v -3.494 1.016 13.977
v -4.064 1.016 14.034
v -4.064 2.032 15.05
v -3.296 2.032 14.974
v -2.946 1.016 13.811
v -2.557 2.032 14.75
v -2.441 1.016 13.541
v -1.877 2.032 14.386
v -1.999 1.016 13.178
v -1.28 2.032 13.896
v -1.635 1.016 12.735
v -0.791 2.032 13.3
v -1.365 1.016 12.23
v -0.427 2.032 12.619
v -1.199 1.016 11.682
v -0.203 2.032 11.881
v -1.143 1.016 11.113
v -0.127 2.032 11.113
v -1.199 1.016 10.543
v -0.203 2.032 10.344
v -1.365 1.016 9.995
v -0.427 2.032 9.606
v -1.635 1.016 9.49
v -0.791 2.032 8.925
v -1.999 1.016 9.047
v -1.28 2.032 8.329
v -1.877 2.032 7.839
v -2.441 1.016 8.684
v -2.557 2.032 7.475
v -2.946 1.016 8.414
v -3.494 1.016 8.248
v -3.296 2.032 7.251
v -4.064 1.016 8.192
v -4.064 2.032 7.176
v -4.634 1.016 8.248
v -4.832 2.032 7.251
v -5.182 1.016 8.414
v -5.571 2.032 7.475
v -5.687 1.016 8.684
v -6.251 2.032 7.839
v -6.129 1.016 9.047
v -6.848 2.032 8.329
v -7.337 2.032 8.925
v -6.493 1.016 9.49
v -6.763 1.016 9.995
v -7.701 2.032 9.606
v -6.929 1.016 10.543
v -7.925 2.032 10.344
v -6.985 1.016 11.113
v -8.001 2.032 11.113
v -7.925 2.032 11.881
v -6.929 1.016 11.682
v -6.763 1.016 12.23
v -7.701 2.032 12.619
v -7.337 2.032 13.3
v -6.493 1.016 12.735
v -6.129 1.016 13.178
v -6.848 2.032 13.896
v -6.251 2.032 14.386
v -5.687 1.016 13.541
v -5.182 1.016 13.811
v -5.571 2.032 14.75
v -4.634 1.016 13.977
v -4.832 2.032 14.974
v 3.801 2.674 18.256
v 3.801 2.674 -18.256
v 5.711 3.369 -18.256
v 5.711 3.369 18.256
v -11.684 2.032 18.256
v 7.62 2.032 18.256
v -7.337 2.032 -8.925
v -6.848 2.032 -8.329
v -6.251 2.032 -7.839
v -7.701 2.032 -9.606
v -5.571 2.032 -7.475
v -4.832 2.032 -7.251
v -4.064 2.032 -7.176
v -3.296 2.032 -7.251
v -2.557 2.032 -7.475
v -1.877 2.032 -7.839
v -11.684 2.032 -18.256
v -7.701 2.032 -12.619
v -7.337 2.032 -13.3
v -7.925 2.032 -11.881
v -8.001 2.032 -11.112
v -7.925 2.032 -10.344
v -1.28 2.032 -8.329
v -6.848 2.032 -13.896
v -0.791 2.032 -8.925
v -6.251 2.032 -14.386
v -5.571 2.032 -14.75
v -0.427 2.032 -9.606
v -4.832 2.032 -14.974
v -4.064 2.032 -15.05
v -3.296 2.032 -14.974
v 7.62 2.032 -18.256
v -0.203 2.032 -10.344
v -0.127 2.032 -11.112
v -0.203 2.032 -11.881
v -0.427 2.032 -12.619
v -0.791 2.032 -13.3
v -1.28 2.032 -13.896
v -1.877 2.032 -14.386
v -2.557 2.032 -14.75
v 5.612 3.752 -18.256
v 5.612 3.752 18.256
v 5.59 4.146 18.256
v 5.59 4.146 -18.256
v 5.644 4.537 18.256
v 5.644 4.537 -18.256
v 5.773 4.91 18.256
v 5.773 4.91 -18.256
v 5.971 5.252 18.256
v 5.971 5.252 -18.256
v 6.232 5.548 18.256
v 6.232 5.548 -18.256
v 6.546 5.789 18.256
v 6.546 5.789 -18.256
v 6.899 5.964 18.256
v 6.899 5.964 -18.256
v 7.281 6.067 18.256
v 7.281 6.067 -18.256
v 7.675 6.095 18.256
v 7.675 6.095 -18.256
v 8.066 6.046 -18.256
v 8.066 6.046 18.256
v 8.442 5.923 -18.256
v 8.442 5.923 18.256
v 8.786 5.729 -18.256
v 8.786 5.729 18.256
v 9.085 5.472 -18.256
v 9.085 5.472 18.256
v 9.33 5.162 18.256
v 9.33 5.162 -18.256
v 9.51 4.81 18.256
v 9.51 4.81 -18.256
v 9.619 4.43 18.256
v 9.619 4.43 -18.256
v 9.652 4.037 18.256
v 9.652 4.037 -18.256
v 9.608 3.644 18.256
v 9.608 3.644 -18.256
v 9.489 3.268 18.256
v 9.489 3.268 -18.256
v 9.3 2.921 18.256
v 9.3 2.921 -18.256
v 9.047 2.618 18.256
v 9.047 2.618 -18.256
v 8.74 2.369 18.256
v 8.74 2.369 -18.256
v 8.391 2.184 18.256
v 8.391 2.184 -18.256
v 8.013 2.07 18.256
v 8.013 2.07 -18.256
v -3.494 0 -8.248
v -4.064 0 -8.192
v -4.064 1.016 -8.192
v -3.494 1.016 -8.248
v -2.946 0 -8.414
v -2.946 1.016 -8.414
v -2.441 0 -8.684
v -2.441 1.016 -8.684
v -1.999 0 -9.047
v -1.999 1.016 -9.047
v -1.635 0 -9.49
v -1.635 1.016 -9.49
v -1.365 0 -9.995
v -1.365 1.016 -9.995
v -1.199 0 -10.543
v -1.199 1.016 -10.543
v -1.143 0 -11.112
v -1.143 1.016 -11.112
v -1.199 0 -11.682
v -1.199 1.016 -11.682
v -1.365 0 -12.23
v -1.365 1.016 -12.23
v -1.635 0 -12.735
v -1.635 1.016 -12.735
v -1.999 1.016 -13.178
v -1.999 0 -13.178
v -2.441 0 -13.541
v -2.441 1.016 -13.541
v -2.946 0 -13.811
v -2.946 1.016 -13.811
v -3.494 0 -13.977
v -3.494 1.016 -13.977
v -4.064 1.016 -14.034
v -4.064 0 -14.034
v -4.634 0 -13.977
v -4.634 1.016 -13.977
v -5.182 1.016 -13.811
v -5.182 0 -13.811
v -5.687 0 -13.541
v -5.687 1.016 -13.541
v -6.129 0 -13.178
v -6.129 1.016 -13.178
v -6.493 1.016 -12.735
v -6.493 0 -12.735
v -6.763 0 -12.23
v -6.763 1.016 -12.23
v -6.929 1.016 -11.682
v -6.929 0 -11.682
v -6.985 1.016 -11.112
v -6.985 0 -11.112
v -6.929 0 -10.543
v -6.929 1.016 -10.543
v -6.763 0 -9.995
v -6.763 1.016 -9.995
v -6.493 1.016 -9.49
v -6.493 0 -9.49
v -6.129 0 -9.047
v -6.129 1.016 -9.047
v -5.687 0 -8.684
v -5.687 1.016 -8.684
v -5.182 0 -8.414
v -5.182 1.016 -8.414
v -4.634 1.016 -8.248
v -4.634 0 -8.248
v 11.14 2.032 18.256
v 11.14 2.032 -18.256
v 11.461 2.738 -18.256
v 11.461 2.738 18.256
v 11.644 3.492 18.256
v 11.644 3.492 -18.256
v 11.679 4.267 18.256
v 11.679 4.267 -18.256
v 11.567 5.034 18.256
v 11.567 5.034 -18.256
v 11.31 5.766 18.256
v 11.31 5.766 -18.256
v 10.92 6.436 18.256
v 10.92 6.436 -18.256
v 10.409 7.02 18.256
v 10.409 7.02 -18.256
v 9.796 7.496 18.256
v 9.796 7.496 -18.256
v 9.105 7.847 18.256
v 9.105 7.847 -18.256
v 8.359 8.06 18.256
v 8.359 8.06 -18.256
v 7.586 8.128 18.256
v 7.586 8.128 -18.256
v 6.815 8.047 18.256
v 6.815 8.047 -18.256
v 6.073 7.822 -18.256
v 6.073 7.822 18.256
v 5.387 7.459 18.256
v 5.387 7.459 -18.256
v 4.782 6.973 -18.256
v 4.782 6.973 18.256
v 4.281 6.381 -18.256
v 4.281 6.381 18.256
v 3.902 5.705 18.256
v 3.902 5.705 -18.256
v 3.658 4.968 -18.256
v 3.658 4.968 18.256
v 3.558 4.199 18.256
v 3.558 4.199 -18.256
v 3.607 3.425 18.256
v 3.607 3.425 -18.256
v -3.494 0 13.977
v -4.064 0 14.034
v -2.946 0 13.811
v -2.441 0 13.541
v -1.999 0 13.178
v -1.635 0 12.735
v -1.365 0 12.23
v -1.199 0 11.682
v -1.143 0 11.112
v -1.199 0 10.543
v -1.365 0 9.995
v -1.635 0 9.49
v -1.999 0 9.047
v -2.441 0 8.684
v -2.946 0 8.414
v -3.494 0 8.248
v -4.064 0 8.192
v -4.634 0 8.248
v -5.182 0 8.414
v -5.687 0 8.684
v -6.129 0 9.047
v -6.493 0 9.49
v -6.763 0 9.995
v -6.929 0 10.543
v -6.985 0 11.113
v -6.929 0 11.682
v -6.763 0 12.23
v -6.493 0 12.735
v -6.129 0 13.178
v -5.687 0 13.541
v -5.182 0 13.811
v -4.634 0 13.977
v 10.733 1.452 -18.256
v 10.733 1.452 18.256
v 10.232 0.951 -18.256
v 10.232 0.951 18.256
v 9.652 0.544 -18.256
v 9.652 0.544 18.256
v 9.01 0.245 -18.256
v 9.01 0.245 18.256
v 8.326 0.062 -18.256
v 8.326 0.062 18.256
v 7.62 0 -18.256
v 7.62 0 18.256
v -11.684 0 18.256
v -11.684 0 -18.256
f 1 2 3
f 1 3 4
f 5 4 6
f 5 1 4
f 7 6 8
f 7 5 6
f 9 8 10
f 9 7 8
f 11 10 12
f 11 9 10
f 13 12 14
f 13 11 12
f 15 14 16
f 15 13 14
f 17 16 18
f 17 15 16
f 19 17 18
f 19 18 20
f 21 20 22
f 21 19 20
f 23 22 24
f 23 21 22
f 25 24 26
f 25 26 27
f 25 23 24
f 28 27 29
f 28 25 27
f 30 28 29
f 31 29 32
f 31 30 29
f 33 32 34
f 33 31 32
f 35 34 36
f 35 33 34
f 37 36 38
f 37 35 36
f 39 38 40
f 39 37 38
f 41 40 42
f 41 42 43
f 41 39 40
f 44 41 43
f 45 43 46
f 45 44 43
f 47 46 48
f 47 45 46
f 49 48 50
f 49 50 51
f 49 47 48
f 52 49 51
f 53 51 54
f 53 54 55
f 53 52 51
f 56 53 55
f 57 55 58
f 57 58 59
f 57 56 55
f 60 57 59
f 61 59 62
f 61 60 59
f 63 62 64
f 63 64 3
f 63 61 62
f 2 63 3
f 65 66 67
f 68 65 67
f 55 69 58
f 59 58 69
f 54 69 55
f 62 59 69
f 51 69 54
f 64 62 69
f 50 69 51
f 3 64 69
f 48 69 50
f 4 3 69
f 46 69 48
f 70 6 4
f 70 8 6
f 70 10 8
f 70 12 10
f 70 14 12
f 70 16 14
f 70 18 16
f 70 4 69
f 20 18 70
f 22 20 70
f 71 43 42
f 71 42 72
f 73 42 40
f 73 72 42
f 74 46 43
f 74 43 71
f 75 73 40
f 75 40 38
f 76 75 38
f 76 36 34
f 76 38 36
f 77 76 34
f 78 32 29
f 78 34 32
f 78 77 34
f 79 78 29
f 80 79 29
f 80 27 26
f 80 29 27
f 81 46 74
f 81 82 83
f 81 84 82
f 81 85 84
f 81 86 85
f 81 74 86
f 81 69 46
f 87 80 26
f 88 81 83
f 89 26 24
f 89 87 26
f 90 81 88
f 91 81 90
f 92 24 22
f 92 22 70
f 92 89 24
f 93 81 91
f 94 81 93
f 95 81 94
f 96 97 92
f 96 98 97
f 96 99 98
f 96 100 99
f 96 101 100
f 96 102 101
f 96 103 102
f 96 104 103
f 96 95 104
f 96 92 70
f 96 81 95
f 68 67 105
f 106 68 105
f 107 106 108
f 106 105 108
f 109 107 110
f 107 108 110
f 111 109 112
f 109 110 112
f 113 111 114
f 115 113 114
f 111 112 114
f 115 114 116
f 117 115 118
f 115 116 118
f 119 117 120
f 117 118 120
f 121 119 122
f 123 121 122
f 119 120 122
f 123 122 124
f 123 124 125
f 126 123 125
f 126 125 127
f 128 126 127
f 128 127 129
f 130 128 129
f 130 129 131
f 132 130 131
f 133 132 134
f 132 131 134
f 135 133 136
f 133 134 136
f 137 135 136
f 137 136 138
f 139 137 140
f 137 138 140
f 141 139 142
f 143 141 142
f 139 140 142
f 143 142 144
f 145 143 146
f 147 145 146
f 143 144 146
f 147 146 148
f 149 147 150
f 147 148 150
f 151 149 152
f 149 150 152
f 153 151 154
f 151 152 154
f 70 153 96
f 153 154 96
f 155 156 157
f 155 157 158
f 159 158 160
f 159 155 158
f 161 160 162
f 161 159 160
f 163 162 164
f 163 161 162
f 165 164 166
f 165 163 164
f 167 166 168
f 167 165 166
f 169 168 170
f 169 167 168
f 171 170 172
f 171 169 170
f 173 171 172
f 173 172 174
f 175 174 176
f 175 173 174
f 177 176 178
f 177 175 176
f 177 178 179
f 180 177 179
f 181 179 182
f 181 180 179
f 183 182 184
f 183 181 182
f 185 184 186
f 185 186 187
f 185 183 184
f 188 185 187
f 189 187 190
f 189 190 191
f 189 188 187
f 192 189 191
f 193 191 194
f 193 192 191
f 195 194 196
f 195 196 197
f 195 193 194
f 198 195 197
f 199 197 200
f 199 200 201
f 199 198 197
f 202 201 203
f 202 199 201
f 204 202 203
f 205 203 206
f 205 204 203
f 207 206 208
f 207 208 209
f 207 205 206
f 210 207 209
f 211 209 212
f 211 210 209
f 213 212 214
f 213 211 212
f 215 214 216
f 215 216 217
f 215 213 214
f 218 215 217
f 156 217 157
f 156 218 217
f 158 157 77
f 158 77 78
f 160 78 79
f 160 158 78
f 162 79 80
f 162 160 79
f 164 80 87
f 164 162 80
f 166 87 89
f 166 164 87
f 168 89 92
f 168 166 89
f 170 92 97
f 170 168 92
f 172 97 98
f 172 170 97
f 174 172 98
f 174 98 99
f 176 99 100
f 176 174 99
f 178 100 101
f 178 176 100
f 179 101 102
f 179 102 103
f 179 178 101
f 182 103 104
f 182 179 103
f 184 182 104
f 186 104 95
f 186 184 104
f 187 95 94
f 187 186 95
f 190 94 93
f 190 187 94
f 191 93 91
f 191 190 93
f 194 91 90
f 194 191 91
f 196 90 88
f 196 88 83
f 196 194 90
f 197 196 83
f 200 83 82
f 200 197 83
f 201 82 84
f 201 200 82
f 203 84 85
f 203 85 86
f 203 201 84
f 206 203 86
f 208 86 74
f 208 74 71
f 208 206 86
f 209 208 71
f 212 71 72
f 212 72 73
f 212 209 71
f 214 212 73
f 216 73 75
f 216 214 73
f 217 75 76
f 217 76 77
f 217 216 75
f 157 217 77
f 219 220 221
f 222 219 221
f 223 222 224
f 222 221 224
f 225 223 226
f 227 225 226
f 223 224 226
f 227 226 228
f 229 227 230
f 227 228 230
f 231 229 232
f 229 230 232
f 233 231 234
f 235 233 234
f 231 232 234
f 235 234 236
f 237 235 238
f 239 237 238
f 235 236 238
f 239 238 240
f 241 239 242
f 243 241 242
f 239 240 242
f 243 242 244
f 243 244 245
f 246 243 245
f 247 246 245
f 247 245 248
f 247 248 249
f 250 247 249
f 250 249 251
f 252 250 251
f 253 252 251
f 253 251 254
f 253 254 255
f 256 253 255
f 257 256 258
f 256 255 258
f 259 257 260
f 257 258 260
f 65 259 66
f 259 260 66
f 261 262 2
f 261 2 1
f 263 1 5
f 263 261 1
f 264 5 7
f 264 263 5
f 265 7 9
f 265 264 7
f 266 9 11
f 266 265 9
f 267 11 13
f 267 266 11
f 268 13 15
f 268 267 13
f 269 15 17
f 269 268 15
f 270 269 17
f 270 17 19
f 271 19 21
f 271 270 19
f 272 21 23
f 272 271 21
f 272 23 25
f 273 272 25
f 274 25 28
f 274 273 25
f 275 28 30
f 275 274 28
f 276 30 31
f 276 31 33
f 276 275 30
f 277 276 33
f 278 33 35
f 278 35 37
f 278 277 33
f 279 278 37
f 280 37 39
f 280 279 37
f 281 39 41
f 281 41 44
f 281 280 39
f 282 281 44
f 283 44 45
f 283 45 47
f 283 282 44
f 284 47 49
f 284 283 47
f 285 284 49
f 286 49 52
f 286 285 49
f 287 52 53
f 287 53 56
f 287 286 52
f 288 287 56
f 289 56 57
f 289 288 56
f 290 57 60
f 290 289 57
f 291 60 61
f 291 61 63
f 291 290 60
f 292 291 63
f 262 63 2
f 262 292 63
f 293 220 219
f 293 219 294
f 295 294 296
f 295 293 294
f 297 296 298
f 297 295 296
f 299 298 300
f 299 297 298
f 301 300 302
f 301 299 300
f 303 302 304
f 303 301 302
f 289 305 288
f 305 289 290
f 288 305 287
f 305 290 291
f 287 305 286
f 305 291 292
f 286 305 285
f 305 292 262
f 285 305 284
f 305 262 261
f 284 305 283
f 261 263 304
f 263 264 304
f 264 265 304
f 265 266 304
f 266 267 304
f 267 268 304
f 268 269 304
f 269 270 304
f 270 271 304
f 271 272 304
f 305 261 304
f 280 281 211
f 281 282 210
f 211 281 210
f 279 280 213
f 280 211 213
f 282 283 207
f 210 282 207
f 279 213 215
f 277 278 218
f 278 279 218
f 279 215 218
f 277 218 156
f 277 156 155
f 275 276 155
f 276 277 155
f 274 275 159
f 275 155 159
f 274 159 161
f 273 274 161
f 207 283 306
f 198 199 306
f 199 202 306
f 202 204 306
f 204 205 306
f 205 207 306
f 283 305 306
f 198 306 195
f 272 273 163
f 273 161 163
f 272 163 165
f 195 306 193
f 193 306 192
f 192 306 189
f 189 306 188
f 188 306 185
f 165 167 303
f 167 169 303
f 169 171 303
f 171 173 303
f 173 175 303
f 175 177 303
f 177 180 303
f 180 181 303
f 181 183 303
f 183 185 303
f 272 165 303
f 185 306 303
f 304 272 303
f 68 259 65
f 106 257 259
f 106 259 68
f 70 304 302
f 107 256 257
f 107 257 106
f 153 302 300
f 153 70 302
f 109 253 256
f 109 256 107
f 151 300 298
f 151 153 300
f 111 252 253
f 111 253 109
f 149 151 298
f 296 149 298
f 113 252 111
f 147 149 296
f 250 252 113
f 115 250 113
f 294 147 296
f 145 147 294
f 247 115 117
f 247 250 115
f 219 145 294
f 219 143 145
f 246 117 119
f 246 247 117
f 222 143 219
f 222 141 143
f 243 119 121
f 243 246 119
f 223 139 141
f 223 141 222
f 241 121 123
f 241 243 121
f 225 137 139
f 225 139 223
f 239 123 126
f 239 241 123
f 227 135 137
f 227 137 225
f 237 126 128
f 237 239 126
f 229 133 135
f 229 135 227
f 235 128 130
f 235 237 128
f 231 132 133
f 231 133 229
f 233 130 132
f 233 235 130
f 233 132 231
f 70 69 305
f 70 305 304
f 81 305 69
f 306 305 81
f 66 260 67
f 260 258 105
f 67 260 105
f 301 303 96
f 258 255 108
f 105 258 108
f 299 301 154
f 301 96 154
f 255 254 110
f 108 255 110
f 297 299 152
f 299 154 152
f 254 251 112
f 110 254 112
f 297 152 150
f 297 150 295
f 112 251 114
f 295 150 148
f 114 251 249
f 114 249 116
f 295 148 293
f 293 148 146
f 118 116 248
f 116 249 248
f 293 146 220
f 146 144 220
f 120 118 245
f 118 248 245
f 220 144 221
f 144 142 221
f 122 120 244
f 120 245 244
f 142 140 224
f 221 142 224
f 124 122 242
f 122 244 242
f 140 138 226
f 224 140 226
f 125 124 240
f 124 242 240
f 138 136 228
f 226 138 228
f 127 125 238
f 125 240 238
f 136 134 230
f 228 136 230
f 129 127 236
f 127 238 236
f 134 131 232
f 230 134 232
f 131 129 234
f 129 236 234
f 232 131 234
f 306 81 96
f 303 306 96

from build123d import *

# Parameters (mm, degrees)
SKETCH1_W          = 23.368
SKETCH1_H          = 36.5125
SKETCH1_R          = 2.921
BASE_FLANGE1_DEPTH = 2.032
HEM1_START         = -18.25625
HEM1_DEPTH         = 36.5125
HEM1_2_DEPTH       = 36.5125
CHAMFER1_SIZE      = 1.016


# Read off the part's stored shape, not the designer's step: Hem1
# Sheet-metal steps are written as plain solids
with BuildPart() as part:
    # Sketch1 → Base-Flange1 (new body)
    with BuildSketch(Plane(origin=(0, 0, 0), x_dir=(1, 0, 0), z_dir=(0, 1, 0))):
        Rectangle(SKETCH1_W, SKETCH1_H)
        with Locations(Location((-4.064, -11.1125, 0), (0, 0, 270))):
            Circle(SKETCH1_R, mode=Mode.SUBTRACT)
        with Locations(Location((-4.064, 11.1125, 0), (0, 0, 270))):
            Circle(SKETCH1_R, mode=Mode.SUBTRACT)
    extrude(amount=BASE_FLANGE1_DEPTH)

    # Hem1 outline → Hem1 (cut)
    with BuildSketch(Plane.XY.offset(HEM1_START)):
        with BuildLine():
            Line((11.684, 2.032), (11.139527241, 2.032))
            ThreePointArc((11.139527241, 2.032), (9.652, 0.544472759), (7.62, 0))
            Line((7.62, 0), (11.684, 0))
            Line((11.684, 0), (11.684, 2.032))
        make_face()
    extrude(amount=HEM1_DEPTH, mode=Mode.SUBTRACT)

    # Hem1 2 outline → Hem1 2 (add)
    with BuildSketch(Plane.XY.offset(HEM1_START)):
        with BuildLine():
            Line((3.801089189, 2.674030138), (5.710544595, 3.369015069))
            ThreePointArc((5.710544595, 3.369015069), (8.785507319, 5.728516954), (7.62, 2.032))
            Line((7.62, 2.032), (11.139527241, 2.032))
            ThreePointArc((11.139527241, 2.032), (7.974200939, 8.112535253), (3.801089189, 2.674030138))
        make_face()
    extrude(amount=HEM1_2_DEPTH)

    # Chamfer1
    chamfer1_edges = [part.edges().sort_by_distance(p)[0] for p in [
        (-4.064, 2.032, 8.1915),
        (-4.064, 2.032, -14.0335),
    ]]
    chamfer(chamfer1_edges, length=CHAMFER1_SIZE)


solid = part.part
